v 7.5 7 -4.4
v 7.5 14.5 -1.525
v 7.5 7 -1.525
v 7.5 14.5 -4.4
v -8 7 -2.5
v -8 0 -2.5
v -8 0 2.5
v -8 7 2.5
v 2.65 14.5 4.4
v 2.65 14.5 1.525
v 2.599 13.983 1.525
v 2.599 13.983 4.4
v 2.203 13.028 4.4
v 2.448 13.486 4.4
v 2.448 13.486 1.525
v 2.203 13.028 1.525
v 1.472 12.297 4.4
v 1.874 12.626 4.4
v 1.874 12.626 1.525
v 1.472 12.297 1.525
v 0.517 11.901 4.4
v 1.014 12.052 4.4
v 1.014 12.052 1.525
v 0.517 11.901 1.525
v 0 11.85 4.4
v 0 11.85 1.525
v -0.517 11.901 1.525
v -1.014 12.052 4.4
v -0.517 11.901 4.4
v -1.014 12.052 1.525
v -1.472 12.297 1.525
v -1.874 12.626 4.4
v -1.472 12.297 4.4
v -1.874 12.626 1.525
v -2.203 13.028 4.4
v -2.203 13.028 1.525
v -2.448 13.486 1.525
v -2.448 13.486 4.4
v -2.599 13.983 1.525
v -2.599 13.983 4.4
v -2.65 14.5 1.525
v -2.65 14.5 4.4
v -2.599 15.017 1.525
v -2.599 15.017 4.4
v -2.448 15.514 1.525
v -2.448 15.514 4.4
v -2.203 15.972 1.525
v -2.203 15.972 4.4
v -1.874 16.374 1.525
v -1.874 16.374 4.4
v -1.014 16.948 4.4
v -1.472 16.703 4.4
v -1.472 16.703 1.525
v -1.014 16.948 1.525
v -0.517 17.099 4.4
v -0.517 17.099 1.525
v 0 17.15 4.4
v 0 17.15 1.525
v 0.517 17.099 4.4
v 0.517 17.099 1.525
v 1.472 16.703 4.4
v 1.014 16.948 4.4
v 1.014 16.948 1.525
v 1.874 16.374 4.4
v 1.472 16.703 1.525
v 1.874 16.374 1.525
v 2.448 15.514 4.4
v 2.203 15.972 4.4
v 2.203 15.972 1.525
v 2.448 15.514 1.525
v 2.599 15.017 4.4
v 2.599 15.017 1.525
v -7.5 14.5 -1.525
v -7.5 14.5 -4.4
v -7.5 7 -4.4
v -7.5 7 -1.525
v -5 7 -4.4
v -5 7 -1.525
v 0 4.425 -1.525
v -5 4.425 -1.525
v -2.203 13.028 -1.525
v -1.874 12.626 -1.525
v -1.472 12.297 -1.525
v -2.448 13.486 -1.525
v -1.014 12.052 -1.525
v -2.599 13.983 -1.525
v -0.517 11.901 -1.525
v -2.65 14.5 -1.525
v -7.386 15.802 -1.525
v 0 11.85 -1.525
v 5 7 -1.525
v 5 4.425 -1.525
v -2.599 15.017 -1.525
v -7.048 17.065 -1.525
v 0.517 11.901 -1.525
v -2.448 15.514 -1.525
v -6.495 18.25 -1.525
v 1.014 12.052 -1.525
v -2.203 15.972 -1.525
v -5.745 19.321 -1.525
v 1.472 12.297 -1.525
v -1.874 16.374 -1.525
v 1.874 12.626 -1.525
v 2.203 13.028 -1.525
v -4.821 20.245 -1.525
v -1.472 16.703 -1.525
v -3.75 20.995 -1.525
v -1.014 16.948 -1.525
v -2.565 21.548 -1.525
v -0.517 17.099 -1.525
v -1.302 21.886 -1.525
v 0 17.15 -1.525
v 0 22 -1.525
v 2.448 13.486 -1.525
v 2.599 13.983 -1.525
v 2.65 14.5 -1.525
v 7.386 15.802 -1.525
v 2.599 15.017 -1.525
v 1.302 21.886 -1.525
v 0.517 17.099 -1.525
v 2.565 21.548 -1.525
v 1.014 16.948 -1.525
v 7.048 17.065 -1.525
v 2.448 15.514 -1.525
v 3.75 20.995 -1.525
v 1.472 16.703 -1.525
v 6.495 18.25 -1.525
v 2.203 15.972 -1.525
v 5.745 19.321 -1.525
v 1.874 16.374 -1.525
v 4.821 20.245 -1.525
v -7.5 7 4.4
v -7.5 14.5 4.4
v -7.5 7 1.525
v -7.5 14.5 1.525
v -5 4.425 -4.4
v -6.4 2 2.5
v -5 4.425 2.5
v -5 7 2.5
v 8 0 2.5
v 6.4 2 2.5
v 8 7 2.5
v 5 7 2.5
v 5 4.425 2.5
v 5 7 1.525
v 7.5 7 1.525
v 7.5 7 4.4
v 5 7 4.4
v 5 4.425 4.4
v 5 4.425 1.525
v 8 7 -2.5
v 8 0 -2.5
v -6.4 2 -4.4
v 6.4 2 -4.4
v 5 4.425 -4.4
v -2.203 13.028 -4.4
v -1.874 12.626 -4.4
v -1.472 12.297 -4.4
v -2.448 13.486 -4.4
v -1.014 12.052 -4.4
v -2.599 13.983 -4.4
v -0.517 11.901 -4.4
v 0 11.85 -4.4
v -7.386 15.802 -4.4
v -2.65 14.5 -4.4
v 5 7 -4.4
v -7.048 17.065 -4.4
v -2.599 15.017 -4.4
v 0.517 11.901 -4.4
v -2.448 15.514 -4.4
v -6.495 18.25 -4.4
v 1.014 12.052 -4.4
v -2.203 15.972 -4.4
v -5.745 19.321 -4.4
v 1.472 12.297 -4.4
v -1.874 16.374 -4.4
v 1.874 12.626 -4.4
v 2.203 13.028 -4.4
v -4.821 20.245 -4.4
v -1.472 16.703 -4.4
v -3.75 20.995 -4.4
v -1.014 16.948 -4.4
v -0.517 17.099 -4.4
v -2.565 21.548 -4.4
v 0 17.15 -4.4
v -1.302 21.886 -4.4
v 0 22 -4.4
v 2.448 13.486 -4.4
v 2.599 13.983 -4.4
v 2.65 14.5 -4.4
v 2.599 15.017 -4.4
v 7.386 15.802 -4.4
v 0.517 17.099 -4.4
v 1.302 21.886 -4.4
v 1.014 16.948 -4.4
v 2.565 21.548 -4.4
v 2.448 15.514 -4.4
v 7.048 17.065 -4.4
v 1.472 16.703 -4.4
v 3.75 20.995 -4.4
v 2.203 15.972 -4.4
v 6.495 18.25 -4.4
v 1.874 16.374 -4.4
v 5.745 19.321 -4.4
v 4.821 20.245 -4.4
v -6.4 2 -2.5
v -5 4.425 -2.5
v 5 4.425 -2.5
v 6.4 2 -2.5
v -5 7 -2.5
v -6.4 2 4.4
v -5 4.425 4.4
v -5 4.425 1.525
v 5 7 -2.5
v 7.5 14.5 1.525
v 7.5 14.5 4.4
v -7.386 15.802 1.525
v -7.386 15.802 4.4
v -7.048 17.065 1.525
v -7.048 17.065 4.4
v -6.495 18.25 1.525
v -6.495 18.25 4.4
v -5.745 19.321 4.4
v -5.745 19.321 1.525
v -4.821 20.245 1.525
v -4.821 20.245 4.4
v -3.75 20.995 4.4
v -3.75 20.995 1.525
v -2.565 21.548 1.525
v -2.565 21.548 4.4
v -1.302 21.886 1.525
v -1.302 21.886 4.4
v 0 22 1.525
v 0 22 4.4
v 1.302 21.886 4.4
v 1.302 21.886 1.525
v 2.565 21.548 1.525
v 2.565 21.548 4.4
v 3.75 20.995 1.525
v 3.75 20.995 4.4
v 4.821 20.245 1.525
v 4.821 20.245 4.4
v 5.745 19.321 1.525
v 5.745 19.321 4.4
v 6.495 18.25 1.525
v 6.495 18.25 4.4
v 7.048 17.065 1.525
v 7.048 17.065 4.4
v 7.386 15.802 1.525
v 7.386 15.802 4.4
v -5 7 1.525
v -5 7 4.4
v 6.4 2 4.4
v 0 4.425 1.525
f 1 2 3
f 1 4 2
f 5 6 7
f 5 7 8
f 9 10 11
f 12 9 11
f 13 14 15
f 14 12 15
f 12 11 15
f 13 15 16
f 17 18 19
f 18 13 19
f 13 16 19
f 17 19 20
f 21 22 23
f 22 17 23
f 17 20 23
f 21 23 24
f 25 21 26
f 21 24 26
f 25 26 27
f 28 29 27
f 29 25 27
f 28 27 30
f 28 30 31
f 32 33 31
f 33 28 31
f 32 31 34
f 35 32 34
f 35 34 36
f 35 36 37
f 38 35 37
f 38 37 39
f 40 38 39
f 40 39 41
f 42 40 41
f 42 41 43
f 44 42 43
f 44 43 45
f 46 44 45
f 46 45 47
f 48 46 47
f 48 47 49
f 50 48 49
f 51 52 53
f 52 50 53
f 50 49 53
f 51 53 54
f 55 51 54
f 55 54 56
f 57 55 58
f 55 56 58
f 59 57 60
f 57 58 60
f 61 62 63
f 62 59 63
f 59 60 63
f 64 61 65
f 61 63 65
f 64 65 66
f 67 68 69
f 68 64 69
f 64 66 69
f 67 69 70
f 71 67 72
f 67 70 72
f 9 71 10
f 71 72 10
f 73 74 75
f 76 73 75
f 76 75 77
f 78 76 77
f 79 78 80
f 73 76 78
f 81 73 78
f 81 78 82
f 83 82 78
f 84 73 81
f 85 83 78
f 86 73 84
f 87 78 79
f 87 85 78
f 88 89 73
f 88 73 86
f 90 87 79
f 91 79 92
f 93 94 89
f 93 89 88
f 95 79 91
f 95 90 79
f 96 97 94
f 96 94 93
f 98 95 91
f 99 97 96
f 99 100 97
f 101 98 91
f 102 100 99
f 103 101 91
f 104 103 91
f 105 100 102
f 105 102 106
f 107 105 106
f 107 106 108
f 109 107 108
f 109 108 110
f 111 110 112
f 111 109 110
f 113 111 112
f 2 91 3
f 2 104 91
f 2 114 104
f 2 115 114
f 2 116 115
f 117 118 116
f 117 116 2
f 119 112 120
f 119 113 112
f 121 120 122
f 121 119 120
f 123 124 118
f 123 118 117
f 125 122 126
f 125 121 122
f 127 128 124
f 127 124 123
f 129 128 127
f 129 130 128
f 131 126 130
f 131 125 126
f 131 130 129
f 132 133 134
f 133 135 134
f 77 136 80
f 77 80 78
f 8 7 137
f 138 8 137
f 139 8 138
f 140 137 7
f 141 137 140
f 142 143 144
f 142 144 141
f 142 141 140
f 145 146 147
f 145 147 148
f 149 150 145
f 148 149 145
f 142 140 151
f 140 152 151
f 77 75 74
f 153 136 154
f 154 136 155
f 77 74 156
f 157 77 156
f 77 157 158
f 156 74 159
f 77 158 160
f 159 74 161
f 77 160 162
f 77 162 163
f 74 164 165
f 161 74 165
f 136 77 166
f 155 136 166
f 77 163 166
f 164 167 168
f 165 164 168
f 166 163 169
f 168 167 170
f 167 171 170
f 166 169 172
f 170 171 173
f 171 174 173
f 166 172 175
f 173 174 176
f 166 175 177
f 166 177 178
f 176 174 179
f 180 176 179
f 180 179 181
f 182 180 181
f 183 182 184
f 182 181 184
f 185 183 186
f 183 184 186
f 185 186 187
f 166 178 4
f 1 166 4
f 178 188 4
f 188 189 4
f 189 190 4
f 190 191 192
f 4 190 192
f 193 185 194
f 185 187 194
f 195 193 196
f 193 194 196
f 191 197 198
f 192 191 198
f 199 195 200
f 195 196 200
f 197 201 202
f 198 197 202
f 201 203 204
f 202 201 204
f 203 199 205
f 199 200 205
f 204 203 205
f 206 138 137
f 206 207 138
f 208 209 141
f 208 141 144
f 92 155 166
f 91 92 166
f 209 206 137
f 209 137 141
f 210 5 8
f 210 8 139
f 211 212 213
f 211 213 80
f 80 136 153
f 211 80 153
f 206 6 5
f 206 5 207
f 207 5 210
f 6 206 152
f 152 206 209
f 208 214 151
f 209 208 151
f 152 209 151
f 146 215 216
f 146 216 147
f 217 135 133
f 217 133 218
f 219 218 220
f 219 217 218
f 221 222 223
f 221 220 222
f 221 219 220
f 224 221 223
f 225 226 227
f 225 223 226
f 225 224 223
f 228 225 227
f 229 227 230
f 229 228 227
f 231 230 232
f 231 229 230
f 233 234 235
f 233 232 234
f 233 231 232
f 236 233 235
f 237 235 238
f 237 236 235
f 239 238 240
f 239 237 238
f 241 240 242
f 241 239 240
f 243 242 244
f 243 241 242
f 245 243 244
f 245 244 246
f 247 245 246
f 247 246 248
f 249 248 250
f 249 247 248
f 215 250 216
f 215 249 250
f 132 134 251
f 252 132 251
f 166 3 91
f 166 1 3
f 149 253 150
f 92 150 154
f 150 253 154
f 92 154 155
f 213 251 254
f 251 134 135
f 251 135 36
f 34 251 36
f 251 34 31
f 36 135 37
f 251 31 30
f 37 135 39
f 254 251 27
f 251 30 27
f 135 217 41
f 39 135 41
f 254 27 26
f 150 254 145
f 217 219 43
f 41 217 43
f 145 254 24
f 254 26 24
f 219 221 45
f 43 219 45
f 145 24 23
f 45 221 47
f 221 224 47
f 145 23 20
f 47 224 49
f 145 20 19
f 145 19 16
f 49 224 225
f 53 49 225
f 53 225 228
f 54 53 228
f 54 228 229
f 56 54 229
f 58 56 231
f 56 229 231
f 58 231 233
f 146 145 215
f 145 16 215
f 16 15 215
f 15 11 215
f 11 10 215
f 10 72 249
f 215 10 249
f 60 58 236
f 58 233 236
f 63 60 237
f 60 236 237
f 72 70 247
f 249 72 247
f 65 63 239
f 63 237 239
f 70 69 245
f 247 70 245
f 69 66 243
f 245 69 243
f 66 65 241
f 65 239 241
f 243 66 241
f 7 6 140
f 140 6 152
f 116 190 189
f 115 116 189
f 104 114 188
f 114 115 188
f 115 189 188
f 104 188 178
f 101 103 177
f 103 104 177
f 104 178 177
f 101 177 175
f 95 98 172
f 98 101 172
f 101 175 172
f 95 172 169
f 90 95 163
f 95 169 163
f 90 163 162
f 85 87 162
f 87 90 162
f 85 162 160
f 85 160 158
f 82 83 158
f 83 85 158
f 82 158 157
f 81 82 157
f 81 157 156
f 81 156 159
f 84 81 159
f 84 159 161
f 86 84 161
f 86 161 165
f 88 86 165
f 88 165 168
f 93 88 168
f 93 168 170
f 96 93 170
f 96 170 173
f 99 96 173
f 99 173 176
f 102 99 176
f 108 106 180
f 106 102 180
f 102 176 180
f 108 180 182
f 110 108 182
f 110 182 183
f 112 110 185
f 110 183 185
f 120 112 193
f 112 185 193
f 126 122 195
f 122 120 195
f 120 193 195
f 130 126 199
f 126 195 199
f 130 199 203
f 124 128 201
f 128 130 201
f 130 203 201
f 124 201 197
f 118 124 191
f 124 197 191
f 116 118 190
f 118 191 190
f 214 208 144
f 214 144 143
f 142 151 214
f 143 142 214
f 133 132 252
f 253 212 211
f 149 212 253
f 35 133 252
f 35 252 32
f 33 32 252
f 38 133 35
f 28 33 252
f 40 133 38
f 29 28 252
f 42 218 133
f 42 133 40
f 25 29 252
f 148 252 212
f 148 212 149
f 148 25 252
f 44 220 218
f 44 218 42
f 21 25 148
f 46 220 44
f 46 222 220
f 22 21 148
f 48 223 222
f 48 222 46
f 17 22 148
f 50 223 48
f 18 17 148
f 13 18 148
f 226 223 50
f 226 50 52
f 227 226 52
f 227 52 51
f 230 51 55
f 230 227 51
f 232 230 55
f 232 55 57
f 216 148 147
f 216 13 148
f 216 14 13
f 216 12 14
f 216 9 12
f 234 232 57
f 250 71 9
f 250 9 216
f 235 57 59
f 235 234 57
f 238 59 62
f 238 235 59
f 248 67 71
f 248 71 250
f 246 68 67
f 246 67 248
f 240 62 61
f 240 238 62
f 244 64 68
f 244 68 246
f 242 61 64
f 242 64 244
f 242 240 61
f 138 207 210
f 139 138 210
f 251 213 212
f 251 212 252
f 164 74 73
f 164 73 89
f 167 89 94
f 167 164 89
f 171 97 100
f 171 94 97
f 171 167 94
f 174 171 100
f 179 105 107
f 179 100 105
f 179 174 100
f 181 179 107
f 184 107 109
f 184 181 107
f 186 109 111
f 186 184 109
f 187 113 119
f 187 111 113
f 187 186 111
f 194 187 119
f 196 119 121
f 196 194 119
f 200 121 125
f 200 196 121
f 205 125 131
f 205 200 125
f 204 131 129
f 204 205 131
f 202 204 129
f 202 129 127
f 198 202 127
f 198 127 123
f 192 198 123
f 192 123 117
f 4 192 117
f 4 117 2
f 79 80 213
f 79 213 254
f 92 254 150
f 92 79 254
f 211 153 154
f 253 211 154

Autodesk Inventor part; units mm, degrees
ref_plane "YZ Plane" through (0, 0, 0) normal (1, 0, 0) x (0, 1, 0)
ref_plane "XZ Plane" through (0, 0, 0) normal (0, 1, 0) x (-1, 0, 0)
ref_plane "XY Plane" through (0, 0, 0) normal (0, 0, 1) x (1, 0, 0)
sketch "草圖1" plane through (0, 0, 0) normal (0, 0, 1) x (1, 0, 0)
  line L0 (0, 14.1483) -> (0, -10.3645)
  line L1 (0, 0) -> (-8, 0)
  line L2 (-8, 0) -> (-8, 7)
  line L3 (-8, 7) -> (-5, 7)
  line L4 (0, 0) -> (8, 0)
  line L5 (8, 0) -> (8, 7)
  line L6 (8, 7) -> (5, 7)
  circle A0 centre (0, 14.5) radius 2.65
  circle A1 centre (0, 14.5) radius 7.5 construction
  line L7 (-5, 4.4249) -> (-6.4, 2)
  line L8 (-6.4, 2) -> (0.3304, 2)
  line L9 (0.3304, 2) -> (6.4, 2)
  line L10 (6.4, 2) -> (5, 4.4249)
  line L11 (5, 4.4249) -> (5, 7)
  arc A2 (7.5, 14.5) -> (-7.5, 14.5) centre (0, 14.5) ccw
  line L12 (-7.5, 14.5) -> (-7.5, 7)
  line L13 (7.5, 14.5) -> (7.5, 7)
  line L14 (-5, 4.4249) -> (-5, 7)
  line L15 (-5, 4.4249) -> (5, 4.4249)
  point P0 (0, 2)
  dimension "d5" = 3
  dimension "d7" = 5.3
  dimension "d14" = 15
  dimension "d19" = 60
  dimension "d20" = 1.6
  dimension "d21" = 2
  dimension "d22" = 60
  dimension "d23" = 10
  dimension "d24" = 5
extrude "擠出1" add sketch "草圖1" along normal mid plane 5 contours L8 L9 L10 L11 L6 L5 L4 L0 | L0 L1 L2 L3 L14 L7 L8
extrude "擠出2" add sketch "草圖1" along normal mid plane 8.8 separate body contours L15 L14 L3 L12 A2 L13 L6 L11 | L15 L10 L9 L8 L0 | L0 L8 L7 L15
extrude "擠出3" cut sketch "草圖1" along normal mid plane 3.05 contours L15 L14 L3 L12 A2 L13 L6 L11 bodies 2
properties part number "base"
